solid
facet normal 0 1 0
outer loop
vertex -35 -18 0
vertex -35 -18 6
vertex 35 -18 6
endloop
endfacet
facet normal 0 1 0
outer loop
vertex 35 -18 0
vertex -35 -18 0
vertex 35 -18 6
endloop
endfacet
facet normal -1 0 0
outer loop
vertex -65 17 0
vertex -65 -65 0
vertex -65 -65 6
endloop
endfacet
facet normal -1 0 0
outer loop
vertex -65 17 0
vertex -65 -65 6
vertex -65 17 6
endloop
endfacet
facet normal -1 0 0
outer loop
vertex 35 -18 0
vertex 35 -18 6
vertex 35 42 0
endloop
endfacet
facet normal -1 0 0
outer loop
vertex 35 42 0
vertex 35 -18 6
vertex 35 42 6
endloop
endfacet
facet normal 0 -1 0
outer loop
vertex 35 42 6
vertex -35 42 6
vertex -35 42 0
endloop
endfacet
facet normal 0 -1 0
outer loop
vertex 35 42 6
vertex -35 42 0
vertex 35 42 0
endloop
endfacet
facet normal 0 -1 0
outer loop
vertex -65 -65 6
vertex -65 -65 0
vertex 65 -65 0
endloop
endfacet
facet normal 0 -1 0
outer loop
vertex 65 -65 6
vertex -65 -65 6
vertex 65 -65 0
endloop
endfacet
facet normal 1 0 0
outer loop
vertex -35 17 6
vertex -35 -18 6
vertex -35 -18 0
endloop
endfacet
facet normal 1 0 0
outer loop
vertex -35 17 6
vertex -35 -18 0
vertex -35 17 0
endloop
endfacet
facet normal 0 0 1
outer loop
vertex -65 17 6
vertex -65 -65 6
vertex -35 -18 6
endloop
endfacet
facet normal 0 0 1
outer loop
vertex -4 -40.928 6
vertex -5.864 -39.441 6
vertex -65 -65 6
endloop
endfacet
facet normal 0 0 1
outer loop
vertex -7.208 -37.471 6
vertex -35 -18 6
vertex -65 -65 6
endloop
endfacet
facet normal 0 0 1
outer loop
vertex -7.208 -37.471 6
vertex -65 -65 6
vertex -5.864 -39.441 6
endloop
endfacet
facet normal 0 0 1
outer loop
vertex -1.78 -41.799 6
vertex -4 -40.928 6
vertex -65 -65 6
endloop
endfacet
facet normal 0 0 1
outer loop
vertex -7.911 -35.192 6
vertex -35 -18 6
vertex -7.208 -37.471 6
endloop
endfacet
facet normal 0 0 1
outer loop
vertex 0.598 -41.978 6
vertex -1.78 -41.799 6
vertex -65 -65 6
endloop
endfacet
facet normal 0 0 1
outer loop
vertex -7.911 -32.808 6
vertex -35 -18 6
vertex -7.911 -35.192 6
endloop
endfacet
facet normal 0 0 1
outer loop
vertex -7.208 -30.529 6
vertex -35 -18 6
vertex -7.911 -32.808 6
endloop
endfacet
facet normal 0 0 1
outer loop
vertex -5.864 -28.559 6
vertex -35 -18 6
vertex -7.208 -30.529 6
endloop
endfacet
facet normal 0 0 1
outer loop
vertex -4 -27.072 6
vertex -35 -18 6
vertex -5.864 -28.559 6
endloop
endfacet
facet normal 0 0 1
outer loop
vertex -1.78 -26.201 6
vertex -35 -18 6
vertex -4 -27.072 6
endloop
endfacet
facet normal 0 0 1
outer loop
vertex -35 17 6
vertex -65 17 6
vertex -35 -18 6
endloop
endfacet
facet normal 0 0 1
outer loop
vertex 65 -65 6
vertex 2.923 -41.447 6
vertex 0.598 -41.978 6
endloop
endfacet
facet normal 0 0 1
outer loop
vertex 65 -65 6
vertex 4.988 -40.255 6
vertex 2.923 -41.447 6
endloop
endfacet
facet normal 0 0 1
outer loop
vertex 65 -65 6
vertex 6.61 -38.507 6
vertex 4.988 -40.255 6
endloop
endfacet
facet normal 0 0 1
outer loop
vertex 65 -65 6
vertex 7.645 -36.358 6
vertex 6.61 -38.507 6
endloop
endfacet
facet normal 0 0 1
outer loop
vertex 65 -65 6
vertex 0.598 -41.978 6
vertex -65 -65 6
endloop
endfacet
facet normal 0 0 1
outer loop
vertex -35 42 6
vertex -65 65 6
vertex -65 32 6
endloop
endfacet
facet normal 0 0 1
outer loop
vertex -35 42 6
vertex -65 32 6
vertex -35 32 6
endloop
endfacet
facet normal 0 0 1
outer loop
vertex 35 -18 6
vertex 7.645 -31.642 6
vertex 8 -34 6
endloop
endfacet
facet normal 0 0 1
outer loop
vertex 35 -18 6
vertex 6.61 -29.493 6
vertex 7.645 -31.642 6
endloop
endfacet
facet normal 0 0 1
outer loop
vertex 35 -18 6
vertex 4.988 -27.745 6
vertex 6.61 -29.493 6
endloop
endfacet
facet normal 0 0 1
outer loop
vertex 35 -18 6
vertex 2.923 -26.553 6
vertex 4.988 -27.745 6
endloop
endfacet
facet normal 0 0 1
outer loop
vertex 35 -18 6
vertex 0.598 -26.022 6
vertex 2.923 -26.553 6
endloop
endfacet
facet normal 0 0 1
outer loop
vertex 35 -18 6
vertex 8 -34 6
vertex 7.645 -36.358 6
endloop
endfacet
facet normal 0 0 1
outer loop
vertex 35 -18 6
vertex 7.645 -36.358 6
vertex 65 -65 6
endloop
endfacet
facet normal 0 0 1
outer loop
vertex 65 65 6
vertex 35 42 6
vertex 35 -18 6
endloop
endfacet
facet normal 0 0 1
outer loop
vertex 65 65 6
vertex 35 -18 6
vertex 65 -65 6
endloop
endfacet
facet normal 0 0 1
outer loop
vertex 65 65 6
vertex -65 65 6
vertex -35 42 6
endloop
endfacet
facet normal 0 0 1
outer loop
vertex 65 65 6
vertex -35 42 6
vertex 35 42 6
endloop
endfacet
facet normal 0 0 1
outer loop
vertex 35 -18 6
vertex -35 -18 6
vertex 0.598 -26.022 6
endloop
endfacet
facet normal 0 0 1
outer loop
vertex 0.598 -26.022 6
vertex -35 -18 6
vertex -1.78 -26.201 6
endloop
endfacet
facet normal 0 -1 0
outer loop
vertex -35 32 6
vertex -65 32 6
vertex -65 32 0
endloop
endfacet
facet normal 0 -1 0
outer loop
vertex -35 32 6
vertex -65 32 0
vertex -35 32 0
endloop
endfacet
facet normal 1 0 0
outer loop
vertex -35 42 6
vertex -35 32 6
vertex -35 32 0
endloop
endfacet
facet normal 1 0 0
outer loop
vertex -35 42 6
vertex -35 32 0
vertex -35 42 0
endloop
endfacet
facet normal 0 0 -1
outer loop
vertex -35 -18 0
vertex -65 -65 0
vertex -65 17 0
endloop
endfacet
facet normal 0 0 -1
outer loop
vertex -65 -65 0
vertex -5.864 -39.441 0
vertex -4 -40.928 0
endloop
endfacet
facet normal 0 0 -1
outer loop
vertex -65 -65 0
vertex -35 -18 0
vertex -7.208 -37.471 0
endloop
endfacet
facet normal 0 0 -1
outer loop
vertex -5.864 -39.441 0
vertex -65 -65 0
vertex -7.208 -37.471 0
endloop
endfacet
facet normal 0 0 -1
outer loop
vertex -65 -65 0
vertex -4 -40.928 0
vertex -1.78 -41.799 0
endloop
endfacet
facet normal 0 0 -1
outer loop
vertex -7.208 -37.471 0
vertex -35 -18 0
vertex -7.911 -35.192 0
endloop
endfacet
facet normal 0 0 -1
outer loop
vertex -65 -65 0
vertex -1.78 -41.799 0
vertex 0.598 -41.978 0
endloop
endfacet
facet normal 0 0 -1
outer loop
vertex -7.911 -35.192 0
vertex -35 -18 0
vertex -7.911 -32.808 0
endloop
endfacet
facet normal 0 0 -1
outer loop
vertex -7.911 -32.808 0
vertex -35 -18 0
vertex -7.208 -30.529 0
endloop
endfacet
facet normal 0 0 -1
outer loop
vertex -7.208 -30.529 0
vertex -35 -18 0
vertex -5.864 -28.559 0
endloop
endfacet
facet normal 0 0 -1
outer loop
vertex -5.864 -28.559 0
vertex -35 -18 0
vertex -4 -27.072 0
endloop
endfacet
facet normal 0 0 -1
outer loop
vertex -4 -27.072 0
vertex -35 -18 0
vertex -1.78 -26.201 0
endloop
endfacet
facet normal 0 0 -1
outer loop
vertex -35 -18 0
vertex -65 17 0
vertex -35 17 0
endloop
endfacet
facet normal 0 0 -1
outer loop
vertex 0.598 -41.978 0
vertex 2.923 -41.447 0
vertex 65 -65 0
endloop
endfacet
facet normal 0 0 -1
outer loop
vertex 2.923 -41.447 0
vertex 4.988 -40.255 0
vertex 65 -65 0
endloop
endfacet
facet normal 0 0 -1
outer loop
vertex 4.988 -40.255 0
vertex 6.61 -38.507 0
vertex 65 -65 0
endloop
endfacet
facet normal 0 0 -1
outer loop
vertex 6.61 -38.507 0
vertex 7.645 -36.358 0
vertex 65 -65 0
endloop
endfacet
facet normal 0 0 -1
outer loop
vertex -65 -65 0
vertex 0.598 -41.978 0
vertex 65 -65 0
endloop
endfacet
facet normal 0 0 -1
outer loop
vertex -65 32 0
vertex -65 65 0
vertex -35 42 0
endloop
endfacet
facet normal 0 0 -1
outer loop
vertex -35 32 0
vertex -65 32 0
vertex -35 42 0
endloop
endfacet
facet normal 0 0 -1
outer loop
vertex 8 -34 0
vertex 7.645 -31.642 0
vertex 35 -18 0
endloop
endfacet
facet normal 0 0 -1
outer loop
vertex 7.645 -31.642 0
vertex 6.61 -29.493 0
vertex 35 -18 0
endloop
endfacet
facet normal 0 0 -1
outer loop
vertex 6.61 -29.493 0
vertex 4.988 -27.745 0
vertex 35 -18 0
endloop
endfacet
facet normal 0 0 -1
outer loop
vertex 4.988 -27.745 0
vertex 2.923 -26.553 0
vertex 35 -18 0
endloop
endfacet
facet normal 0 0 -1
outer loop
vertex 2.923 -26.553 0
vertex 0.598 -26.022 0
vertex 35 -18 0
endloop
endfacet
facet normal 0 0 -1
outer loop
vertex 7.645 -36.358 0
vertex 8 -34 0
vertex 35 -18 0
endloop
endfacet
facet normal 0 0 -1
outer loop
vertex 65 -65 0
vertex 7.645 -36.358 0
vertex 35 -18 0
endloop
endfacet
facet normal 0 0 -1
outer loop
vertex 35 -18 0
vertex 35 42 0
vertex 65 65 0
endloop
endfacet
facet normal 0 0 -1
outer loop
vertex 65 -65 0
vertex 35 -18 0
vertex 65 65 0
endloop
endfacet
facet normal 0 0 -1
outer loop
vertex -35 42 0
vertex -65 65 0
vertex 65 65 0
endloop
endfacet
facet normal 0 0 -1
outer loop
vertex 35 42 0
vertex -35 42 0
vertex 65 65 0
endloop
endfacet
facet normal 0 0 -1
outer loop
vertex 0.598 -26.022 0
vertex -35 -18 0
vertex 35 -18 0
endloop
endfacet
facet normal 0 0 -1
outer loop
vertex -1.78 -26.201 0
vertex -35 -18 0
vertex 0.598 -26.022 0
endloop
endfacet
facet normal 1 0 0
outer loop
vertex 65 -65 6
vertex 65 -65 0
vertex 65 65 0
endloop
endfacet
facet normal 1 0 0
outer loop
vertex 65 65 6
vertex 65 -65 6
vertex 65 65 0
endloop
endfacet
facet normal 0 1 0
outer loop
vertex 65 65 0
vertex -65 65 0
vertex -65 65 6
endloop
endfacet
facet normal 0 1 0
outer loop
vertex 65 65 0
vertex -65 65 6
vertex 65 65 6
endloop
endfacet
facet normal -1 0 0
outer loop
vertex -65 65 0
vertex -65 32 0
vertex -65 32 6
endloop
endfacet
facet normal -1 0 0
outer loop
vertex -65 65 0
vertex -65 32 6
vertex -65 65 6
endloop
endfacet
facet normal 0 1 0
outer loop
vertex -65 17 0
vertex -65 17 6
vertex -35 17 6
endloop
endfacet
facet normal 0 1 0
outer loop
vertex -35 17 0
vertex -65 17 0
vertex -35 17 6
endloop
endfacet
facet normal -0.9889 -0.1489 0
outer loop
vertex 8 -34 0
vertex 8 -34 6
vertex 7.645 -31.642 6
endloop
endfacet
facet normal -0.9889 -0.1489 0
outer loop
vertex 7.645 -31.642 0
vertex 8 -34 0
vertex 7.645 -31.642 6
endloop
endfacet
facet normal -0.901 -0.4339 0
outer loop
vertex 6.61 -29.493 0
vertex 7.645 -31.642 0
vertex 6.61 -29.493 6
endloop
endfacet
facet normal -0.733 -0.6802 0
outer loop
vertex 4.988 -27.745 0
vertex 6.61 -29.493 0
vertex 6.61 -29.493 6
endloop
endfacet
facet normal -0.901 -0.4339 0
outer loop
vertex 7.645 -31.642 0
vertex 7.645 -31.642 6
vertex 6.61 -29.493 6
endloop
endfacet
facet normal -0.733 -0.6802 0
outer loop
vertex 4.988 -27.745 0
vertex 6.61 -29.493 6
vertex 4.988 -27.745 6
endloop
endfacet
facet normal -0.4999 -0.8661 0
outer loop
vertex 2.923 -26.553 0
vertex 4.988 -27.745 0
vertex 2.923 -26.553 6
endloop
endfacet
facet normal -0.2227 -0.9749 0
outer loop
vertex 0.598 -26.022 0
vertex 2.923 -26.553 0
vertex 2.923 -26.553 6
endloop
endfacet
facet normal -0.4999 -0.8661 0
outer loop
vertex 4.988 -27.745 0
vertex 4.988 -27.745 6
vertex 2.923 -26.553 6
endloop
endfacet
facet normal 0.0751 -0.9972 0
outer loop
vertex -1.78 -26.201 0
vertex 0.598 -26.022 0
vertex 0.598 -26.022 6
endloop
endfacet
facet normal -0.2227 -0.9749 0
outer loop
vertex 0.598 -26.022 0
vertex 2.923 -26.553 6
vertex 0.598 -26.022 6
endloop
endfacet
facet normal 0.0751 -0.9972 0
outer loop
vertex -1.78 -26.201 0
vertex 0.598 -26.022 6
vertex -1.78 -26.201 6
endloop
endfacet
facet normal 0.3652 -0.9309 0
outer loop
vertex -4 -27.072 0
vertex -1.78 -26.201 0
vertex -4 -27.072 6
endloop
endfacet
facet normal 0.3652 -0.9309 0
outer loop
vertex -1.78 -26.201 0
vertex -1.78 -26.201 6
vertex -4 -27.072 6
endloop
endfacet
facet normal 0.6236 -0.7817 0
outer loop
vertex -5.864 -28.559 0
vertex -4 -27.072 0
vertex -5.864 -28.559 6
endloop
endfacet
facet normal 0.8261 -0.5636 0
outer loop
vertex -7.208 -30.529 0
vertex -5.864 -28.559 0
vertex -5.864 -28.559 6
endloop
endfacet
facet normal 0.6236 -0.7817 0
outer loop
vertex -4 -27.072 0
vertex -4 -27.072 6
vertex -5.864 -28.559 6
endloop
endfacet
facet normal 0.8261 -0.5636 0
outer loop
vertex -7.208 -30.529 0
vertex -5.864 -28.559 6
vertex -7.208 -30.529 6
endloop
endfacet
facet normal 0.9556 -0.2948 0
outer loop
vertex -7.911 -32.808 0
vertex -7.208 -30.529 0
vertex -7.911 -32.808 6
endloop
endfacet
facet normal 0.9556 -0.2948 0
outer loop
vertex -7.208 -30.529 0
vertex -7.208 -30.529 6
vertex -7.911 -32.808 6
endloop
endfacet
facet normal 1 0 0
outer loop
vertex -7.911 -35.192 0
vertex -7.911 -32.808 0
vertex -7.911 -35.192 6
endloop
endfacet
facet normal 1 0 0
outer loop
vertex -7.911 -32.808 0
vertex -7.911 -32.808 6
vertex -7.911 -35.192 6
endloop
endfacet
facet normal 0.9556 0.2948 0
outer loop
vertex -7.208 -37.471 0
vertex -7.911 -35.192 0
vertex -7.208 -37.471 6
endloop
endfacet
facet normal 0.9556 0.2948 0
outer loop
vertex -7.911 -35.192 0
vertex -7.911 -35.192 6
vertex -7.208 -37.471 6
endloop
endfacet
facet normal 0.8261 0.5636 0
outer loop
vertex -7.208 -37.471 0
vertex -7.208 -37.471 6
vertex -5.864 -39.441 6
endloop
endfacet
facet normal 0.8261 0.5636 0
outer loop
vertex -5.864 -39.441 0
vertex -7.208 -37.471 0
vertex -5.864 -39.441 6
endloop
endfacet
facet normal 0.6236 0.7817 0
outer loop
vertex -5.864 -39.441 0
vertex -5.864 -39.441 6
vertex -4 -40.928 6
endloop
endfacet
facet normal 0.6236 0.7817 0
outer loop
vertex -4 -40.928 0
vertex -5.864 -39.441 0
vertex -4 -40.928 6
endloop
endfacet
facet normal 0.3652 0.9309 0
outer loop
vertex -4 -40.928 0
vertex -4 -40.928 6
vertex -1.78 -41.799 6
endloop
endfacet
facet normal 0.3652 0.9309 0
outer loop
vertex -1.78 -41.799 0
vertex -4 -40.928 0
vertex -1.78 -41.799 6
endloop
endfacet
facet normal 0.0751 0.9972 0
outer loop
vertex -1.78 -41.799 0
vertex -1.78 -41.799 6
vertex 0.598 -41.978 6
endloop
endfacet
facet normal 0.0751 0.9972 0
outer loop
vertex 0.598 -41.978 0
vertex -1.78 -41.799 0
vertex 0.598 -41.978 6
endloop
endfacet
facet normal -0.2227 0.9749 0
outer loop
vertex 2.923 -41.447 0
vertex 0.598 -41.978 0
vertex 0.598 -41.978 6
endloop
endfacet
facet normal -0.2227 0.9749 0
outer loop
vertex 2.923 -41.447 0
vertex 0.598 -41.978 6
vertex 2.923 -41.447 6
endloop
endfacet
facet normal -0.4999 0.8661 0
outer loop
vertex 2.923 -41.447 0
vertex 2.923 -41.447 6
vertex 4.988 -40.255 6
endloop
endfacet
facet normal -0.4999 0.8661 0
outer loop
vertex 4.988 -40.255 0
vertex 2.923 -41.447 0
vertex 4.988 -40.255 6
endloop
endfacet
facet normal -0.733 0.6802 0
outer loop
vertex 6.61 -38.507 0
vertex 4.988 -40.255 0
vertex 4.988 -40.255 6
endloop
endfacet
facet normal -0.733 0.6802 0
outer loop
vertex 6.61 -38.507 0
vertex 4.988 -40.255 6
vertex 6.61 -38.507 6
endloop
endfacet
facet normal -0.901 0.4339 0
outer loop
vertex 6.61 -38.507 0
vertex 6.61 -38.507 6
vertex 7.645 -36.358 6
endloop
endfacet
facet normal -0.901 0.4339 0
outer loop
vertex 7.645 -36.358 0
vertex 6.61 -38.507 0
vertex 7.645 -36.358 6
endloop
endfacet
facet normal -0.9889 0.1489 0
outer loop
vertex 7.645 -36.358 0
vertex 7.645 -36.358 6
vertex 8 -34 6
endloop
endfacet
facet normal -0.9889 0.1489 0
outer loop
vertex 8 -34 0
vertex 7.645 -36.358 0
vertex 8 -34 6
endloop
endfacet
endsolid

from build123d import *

# Parameters (mm, degrees)
SCHIZZO1_W                   = 130
SCHIZZO1_H                   = 130
ESTRUSIONE_ESTRUSIONE1_DEPTH = 6
SCHIZZO2_W                   = 70
SCHIZZO2_H                   = 60
TAGLIO_ESTRUSIONE1_DEPTH     = 15
SCHIZZO3_R                   = 8
TAGLIO_ESTRUSIONE2_DEPTH     = 15
SCHIZZO4_W                   = 30
SCHIZZO4_H                   = 15
TAGLIO_ESTRUSIONE3_DEPTH     = 15


with BuildPart() as part:
    # Schizzo1 → Estrusione-Estrusione1 (new body)
    with BuildSketch(Plane.XY):
        Rectangle(SCHIZZO1_W, SCHIZZO1_H)
    extrude(amount=ESTRUSIONE_ESTRUSIONE1_DEPTH)

    # Schizzo2 → Taglio-Estrusione1 (cut)
    with BuildSketch(Plane.XY.offset(6)):
        with Locations((0, 12)):
            Rectangle(SCHIZZO2_W, SCHIZZO2_H)
    extrude(amount=-TAGLIO_ESTRUSIONE1_DEPTH, mode=Mode.SUBTRACT)

    # Schizzo3 → Taglio-Estrusione2 (cut)
    with BuildSketch(Plane.XY.offset(6)):
        with Locations((0, -34)):
            Circle(SCHIZZO3_R)
    extrude(amount=-TAGLIO_ESTRUSIONE2_DEPTH, mode=Mode.SUBTRACT)

    # Schizzo4 → Taglio-Estrusione3 (cut)
    with BuildSketch(Plane.XY.offset(6)):
        with Locations((-50, 24.5)):
            Rectangle(SCHIZZO4_W, SCHIZZO4_H)
    extrude(amount=-TAGLIO_ESTRUSIONE3_DEPTH, mode=Mode.SUBTRACT)


solid = part.part
